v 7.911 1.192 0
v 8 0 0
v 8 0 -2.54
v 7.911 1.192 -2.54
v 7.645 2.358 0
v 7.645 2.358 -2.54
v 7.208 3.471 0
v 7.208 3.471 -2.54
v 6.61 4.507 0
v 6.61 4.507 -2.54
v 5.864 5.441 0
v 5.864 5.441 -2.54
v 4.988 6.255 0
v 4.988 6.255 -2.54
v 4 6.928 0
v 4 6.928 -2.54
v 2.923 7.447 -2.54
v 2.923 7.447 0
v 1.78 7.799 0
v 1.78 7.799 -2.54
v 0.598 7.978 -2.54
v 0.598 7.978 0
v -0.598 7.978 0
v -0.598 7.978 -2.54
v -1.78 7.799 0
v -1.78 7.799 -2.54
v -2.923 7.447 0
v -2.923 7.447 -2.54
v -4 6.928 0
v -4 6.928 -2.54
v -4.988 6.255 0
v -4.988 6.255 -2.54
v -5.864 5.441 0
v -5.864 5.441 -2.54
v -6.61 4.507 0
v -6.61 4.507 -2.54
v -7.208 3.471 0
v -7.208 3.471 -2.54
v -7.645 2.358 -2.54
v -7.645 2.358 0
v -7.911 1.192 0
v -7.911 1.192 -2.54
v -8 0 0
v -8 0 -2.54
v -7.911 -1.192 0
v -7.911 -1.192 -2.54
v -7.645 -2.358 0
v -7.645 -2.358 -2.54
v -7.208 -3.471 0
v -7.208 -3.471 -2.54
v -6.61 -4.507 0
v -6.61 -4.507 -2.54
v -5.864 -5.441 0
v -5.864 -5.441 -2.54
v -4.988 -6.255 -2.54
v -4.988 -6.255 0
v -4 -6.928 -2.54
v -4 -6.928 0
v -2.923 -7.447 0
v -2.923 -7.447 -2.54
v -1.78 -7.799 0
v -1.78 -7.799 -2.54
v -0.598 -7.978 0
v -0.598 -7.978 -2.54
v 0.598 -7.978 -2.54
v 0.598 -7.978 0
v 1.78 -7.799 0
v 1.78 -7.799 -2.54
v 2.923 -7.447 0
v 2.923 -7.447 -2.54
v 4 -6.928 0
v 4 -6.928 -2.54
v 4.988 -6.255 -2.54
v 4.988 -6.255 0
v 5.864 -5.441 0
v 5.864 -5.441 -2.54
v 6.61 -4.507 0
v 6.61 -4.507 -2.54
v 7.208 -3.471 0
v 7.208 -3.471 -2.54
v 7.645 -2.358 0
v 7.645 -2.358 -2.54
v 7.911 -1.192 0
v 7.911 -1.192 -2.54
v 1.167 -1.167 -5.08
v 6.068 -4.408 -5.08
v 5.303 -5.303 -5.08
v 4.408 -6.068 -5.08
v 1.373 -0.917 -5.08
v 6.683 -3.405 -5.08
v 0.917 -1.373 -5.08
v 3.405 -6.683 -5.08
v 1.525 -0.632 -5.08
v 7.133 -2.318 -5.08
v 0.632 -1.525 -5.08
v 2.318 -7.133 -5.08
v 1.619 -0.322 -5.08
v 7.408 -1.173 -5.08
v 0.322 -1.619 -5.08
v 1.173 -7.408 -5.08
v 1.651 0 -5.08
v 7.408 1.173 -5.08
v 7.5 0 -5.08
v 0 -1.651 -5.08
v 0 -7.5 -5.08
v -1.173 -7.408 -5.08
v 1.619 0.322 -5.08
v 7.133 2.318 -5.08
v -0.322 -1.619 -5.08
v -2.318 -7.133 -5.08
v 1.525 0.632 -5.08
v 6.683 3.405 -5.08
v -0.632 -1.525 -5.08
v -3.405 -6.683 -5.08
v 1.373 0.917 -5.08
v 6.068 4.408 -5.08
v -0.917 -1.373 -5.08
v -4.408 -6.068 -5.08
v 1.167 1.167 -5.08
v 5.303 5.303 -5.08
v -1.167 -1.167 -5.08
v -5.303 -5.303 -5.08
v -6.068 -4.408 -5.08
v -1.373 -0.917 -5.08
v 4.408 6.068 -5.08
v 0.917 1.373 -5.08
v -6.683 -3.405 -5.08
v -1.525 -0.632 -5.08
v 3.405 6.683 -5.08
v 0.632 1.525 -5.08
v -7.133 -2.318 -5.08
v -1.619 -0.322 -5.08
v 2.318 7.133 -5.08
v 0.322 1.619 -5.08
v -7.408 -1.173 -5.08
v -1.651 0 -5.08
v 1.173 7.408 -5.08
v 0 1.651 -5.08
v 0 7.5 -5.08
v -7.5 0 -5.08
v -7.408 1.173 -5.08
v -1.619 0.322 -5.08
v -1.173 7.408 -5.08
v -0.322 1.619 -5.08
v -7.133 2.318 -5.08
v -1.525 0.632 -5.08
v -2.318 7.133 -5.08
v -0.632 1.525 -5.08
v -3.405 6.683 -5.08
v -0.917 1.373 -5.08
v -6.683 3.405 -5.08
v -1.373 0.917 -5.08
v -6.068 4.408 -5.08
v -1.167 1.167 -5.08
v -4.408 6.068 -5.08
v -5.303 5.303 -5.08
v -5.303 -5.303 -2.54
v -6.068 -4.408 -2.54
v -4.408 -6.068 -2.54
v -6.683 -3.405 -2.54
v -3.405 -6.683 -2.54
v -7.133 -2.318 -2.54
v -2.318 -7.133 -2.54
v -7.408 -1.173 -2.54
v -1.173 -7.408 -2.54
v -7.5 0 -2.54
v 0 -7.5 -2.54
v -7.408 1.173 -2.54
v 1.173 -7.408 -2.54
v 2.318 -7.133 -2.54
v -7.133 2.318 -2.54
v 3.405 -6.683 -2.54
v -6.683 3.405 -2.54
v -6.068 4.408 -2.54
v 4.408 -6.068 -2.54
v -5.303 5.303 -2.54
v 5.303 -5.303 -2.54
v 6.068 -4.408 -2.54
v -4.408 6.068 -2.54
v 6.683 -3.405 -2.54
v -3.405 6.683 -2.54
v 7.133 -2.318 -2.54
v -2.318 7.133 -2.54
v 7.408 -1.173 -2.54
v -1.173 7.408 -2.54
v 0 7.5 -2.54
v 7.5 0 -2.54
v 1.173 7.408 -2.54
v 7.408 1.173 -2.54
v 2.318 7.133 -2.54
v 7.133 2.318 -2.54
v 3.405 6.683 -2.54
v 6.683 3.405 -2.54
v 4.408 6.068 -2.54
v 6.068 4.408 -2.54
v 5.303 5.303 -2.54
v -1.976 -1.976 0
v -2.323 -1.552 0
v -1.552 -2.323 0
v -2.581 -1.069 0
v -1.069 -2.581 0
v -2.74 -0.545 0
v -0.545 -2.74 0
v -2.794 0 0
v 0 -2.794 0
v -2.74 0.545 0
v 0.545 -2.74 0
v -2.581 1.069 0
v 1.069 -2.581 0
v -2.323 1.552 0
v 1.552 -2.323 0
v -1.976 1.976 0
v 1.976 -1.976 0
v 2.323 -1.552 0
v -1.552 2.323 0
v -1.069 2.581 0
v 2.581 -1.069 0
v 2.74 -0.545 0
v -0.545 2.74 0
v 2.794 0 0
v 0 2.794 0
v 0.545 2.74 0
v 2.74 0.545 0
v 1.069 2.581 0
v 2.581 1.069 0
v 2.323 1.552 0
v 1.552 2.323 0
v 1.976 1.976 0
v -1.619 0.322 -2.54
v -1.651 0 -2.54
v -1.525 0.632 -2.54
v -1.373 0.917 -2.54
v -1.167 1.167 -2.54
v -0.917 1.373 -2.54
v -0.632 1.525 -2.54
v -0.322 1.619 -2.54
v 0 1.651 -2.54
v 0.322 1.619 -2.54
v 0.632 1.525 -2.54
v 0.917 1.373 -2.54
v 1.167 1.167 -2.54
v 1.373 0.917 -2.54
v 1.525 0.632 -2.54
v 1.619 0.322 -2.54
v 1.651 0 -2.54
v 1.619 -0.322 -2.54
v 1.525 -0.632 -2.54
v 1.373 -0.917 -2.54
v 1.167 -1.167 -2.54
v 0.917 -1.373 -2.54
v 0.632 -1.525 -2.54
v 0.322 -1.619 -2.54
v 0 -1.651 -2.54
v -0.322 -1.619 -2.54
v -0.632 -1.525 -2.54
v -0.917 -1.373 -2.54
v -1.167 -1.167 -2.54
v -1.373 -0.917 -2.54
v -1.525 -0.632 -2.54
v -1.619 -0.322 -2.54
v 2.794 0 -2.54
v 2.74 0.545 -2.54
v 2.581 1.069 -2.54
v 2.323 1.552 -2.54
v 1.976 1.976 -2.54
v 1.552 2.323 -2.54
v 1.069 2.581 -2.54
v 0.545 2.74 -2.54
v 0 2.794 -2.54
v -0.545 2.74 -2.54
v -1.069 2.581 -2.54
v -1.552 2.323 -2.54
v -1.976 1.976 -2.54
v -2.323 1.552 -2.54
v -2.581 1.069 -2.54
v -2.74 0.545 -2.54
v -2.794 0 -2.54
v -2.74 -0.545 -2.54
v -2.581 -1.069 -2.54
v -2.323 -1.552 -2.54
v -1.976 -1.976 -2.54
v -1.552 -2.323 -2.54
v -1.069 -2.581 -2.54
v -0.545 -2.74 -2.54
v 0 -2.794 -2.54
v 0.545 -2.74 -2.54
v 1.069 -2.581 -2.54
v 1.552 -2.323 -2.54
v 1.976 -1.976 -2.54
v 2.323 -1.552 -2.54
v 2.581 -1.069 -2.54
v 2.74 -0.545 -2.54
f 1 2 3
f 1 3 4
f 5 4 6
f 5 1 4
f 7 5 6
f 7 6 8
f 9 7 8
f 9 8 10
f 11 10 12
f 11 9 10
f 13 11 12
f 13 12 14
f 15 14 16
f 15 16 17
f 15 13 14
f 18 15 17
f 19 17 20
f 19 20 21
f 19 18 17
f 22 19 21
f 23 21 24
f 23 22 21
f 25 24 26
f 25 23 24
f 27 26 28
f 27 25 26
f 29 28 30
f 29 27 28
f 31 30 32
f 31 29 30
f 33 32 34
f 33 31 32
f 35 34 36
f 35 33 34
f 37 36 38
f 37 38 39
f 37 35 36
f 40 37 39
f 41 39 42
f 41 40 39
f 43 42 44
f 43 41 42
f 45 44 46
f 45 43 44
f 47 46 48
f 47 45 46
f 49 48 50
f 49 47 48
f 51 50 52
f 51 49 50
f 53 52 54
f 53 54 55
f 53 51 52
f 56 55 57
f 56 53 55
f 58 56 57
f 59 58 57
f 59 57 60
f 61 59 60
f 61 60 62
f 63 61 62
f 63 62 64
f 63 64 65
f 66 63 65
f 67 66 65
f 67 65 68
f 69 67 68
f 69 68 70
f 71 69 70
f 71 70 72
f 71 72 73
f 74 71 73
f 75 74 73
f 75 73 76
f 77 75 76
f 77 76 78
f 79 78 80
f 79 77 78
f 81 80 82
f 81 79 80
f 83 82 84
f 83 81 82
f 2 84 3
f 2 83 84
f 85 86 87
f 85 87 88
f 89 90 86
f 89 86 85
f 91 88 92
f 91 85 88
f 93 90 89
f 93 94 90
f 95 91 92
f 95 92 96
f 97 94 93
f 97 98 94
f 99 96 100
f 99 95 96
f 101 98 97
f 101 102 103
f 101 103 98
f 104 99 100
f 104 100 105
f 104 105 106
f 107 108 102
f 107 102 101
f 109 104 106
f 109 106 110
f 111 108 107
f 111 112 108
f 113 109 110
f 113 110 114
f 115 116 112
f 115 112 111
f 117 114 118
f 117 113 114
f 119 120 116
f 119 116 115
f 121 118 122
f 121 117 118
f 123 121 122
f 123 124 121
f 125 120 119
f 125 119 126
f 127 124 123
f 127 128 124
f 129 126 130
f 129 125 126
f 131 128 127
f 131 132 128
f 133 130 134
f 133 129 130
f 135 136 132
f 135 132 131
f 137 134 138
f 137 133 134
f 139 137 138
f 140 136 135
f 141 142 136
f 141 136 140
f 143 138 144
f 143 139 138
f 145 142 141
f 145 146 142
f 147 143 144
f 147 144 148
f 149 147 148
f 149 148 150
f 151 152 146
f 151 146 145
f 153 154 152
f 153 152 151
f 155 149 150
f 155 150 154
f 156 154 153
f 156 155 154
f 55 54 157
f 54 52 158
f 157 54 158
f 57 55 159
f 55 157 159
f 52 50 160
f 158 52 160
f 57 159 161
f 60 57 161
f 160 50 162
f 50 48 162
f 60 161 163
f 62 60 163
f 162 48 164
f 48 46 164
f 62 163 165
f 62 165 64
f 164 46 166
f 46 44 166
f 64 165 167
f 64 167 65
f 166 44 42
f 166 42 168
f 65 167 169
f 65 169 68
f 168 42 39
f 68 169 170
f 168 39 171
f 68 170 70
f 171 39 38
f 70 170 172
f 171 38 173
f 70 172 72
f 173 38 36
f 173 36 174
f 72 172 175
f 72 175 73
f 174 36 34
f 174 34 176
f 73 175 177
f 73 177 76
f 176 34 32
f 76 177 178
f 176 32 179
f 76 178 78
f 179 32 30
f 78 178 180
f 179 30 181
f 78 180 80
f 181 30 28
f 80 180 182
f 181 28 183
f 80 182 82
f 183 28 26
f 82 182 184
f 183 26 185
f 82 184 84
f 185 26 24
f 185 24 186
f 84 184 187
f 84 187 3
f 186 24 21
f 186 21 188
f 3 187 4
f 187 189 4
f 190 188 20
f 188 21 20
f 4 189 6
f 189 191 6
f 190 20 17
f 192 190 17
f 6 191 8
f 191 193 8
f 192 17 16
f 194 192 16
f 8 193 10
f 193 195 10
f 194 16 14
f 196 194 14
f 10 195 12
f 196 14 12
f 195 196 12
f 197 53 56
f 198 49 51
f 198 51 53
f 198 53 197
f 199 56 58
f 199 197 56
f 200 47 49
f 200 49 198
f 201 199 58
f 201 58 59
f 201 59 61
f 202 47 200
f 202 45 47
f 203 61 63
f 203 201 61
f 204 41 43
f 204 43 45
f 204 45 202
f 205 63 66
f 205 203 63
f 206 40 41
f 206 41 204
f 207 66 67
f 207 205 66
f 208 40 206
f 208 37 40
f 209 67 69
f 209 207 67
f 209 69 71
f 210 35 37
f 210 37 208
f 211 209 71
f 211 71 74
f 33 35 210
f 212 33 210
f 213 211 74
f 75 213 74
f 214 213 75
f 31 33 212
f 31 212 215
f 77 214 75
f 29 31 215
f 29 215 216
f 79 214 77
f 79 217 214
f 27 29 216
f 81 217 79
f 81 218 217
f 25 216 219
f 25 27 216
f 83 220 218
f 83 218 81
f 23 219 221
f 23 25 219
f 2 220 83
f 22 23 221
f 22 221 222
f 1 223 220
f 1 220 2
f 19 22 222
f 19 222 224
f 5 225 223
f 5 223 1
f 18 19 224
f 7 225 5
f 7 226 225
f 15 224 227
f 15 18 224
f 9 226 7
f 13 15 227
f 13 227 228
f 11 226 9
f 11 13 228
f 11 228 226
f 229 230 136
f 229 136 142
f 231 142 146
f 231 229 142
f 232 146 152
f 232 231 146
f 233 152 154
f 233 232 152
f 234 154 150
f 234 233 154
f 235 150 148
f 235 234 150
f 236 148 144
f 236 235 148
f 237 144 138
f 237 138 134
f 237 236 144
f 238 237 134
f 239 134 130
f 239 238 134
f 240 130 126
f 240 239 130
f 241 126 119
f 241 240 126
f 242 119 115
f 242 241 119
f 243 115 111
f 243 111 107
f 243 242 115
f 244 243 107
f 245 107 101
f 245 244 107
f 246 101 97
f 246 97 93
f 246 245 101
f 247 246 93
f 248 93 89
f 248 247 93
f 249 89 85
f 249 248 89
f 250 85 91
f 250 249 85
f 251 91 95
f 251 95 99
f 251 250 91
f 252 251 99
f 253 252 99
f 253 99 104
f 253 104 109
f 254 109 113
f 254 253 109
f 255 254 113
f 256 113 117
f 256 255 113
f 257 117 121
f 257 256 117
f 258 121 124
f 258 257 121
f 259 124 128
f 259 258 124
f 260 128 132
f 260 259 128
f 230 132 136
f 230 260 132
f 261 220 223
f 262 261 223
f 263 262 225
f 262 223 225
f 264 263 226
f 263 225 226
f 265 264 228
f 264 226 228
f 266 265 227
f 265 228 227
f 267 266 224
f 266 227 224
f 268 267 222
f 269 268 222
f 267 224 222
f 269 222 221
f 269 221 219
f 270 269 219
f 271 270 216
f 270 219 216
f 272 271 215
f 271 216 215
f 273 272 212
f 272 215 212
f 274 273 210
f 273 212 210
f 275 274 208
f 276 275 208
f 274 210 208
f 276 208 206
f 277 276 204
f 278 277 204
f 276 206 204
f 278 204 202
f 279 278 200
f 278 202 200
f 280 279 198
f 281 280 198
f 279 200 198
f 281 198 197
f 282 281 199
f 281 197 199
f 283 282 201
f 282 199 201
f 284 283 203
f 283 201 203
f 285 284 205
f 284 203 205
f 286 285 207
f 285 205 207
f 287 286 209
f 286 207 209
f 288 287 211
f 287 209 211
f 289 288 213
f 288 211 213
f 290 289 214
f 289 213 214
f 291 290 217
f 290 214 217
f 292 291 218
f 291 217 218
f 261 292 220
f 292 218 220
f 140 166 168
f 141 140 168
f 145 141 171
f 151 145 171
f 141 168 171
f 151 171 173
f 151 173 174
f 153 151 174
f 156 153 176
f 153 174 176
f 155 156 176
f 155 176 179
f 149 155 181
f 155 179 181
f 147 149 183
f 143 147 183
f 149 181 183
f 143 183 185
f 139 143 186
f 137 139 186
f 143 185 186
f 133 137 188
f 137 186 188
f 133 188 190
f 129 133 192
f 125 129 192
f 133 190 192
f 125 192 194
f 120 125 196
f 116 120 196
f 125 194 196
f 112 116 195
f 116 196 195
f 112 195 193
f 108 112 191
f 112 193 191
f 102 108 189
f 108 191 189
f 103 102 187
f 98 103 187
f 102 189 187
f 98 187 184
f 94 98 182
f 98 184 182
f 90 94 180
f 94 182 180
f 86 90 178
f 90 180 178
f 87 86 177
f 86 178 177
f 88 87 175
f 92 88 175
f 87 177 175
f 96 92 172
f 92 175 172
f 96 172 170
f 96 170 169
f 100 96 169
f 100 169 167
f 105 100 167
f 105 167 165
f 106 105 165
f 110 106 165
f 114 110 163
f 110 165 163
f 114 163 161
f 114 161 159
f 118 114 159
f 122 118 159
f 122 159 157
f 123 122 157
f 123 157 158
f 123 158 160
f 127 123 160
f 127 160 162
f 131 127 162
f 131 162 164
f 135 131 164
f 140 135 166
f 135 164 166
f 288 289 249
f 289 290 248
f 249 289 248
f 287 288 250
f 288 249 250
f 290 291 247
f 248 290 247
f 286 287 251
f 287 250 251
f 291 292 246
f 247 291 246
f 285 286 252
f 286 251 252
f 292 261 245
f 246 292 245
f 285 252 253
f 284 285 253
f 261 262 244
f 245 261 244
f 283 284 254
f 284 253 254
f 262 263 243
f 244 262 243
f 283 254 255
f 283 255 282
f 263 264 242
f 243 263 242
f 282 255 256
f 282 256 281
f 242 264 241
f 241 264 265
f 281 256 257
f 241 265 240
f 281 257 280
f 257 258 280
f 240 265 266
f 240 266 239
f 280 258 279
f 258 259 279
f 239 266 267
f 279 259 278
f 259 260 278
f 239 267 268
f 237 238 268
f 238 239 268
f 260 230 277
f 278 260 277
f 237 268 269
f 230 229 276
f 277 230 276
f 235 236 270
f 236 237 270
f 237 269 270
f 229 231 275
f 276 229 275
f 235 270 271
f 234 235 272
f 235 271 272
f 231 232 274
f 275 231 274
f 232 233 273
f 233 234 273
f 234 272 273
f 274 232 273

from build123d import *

# Parameters (mm, degrees)
SKETCH1_R           = 8
SKETCH1_R_2         = 2.794
BOSS_EXTRUDE1_DEPTH = 2.54
SKETCH2_R           = 7.5
SKETCH2_R_2         = 1.651
BOSS_EXTRUDE2_DEPTH = 2.54


with BuildPart() as part:
    # Sketch1 → Boss-Extrude1 (new body)
    with BuildSketch(Plane.XY):
        Circle(SKETCH1_R)
        Circle(SKETCH1_R_2, mode=Mode.SUBTRACT)
    extrude(amount=-BOSS_EXTRUDE1_DEPTH)

    # Sketch2 → Boss-Extrude2 (add)
    with BuildSketch(Plane(origin=(0, 0, -2.54), x_dir=(-1, 0, 0), z_dir=(0, 0, -1))):
        Circle(SKETCH2_R)
        Circle(SKETCH2_R_2, mode=Mode.SUBTRACT)
    extrude(amount=BOSS_EXTRUDE2_DEPTH)


solid = part.part
